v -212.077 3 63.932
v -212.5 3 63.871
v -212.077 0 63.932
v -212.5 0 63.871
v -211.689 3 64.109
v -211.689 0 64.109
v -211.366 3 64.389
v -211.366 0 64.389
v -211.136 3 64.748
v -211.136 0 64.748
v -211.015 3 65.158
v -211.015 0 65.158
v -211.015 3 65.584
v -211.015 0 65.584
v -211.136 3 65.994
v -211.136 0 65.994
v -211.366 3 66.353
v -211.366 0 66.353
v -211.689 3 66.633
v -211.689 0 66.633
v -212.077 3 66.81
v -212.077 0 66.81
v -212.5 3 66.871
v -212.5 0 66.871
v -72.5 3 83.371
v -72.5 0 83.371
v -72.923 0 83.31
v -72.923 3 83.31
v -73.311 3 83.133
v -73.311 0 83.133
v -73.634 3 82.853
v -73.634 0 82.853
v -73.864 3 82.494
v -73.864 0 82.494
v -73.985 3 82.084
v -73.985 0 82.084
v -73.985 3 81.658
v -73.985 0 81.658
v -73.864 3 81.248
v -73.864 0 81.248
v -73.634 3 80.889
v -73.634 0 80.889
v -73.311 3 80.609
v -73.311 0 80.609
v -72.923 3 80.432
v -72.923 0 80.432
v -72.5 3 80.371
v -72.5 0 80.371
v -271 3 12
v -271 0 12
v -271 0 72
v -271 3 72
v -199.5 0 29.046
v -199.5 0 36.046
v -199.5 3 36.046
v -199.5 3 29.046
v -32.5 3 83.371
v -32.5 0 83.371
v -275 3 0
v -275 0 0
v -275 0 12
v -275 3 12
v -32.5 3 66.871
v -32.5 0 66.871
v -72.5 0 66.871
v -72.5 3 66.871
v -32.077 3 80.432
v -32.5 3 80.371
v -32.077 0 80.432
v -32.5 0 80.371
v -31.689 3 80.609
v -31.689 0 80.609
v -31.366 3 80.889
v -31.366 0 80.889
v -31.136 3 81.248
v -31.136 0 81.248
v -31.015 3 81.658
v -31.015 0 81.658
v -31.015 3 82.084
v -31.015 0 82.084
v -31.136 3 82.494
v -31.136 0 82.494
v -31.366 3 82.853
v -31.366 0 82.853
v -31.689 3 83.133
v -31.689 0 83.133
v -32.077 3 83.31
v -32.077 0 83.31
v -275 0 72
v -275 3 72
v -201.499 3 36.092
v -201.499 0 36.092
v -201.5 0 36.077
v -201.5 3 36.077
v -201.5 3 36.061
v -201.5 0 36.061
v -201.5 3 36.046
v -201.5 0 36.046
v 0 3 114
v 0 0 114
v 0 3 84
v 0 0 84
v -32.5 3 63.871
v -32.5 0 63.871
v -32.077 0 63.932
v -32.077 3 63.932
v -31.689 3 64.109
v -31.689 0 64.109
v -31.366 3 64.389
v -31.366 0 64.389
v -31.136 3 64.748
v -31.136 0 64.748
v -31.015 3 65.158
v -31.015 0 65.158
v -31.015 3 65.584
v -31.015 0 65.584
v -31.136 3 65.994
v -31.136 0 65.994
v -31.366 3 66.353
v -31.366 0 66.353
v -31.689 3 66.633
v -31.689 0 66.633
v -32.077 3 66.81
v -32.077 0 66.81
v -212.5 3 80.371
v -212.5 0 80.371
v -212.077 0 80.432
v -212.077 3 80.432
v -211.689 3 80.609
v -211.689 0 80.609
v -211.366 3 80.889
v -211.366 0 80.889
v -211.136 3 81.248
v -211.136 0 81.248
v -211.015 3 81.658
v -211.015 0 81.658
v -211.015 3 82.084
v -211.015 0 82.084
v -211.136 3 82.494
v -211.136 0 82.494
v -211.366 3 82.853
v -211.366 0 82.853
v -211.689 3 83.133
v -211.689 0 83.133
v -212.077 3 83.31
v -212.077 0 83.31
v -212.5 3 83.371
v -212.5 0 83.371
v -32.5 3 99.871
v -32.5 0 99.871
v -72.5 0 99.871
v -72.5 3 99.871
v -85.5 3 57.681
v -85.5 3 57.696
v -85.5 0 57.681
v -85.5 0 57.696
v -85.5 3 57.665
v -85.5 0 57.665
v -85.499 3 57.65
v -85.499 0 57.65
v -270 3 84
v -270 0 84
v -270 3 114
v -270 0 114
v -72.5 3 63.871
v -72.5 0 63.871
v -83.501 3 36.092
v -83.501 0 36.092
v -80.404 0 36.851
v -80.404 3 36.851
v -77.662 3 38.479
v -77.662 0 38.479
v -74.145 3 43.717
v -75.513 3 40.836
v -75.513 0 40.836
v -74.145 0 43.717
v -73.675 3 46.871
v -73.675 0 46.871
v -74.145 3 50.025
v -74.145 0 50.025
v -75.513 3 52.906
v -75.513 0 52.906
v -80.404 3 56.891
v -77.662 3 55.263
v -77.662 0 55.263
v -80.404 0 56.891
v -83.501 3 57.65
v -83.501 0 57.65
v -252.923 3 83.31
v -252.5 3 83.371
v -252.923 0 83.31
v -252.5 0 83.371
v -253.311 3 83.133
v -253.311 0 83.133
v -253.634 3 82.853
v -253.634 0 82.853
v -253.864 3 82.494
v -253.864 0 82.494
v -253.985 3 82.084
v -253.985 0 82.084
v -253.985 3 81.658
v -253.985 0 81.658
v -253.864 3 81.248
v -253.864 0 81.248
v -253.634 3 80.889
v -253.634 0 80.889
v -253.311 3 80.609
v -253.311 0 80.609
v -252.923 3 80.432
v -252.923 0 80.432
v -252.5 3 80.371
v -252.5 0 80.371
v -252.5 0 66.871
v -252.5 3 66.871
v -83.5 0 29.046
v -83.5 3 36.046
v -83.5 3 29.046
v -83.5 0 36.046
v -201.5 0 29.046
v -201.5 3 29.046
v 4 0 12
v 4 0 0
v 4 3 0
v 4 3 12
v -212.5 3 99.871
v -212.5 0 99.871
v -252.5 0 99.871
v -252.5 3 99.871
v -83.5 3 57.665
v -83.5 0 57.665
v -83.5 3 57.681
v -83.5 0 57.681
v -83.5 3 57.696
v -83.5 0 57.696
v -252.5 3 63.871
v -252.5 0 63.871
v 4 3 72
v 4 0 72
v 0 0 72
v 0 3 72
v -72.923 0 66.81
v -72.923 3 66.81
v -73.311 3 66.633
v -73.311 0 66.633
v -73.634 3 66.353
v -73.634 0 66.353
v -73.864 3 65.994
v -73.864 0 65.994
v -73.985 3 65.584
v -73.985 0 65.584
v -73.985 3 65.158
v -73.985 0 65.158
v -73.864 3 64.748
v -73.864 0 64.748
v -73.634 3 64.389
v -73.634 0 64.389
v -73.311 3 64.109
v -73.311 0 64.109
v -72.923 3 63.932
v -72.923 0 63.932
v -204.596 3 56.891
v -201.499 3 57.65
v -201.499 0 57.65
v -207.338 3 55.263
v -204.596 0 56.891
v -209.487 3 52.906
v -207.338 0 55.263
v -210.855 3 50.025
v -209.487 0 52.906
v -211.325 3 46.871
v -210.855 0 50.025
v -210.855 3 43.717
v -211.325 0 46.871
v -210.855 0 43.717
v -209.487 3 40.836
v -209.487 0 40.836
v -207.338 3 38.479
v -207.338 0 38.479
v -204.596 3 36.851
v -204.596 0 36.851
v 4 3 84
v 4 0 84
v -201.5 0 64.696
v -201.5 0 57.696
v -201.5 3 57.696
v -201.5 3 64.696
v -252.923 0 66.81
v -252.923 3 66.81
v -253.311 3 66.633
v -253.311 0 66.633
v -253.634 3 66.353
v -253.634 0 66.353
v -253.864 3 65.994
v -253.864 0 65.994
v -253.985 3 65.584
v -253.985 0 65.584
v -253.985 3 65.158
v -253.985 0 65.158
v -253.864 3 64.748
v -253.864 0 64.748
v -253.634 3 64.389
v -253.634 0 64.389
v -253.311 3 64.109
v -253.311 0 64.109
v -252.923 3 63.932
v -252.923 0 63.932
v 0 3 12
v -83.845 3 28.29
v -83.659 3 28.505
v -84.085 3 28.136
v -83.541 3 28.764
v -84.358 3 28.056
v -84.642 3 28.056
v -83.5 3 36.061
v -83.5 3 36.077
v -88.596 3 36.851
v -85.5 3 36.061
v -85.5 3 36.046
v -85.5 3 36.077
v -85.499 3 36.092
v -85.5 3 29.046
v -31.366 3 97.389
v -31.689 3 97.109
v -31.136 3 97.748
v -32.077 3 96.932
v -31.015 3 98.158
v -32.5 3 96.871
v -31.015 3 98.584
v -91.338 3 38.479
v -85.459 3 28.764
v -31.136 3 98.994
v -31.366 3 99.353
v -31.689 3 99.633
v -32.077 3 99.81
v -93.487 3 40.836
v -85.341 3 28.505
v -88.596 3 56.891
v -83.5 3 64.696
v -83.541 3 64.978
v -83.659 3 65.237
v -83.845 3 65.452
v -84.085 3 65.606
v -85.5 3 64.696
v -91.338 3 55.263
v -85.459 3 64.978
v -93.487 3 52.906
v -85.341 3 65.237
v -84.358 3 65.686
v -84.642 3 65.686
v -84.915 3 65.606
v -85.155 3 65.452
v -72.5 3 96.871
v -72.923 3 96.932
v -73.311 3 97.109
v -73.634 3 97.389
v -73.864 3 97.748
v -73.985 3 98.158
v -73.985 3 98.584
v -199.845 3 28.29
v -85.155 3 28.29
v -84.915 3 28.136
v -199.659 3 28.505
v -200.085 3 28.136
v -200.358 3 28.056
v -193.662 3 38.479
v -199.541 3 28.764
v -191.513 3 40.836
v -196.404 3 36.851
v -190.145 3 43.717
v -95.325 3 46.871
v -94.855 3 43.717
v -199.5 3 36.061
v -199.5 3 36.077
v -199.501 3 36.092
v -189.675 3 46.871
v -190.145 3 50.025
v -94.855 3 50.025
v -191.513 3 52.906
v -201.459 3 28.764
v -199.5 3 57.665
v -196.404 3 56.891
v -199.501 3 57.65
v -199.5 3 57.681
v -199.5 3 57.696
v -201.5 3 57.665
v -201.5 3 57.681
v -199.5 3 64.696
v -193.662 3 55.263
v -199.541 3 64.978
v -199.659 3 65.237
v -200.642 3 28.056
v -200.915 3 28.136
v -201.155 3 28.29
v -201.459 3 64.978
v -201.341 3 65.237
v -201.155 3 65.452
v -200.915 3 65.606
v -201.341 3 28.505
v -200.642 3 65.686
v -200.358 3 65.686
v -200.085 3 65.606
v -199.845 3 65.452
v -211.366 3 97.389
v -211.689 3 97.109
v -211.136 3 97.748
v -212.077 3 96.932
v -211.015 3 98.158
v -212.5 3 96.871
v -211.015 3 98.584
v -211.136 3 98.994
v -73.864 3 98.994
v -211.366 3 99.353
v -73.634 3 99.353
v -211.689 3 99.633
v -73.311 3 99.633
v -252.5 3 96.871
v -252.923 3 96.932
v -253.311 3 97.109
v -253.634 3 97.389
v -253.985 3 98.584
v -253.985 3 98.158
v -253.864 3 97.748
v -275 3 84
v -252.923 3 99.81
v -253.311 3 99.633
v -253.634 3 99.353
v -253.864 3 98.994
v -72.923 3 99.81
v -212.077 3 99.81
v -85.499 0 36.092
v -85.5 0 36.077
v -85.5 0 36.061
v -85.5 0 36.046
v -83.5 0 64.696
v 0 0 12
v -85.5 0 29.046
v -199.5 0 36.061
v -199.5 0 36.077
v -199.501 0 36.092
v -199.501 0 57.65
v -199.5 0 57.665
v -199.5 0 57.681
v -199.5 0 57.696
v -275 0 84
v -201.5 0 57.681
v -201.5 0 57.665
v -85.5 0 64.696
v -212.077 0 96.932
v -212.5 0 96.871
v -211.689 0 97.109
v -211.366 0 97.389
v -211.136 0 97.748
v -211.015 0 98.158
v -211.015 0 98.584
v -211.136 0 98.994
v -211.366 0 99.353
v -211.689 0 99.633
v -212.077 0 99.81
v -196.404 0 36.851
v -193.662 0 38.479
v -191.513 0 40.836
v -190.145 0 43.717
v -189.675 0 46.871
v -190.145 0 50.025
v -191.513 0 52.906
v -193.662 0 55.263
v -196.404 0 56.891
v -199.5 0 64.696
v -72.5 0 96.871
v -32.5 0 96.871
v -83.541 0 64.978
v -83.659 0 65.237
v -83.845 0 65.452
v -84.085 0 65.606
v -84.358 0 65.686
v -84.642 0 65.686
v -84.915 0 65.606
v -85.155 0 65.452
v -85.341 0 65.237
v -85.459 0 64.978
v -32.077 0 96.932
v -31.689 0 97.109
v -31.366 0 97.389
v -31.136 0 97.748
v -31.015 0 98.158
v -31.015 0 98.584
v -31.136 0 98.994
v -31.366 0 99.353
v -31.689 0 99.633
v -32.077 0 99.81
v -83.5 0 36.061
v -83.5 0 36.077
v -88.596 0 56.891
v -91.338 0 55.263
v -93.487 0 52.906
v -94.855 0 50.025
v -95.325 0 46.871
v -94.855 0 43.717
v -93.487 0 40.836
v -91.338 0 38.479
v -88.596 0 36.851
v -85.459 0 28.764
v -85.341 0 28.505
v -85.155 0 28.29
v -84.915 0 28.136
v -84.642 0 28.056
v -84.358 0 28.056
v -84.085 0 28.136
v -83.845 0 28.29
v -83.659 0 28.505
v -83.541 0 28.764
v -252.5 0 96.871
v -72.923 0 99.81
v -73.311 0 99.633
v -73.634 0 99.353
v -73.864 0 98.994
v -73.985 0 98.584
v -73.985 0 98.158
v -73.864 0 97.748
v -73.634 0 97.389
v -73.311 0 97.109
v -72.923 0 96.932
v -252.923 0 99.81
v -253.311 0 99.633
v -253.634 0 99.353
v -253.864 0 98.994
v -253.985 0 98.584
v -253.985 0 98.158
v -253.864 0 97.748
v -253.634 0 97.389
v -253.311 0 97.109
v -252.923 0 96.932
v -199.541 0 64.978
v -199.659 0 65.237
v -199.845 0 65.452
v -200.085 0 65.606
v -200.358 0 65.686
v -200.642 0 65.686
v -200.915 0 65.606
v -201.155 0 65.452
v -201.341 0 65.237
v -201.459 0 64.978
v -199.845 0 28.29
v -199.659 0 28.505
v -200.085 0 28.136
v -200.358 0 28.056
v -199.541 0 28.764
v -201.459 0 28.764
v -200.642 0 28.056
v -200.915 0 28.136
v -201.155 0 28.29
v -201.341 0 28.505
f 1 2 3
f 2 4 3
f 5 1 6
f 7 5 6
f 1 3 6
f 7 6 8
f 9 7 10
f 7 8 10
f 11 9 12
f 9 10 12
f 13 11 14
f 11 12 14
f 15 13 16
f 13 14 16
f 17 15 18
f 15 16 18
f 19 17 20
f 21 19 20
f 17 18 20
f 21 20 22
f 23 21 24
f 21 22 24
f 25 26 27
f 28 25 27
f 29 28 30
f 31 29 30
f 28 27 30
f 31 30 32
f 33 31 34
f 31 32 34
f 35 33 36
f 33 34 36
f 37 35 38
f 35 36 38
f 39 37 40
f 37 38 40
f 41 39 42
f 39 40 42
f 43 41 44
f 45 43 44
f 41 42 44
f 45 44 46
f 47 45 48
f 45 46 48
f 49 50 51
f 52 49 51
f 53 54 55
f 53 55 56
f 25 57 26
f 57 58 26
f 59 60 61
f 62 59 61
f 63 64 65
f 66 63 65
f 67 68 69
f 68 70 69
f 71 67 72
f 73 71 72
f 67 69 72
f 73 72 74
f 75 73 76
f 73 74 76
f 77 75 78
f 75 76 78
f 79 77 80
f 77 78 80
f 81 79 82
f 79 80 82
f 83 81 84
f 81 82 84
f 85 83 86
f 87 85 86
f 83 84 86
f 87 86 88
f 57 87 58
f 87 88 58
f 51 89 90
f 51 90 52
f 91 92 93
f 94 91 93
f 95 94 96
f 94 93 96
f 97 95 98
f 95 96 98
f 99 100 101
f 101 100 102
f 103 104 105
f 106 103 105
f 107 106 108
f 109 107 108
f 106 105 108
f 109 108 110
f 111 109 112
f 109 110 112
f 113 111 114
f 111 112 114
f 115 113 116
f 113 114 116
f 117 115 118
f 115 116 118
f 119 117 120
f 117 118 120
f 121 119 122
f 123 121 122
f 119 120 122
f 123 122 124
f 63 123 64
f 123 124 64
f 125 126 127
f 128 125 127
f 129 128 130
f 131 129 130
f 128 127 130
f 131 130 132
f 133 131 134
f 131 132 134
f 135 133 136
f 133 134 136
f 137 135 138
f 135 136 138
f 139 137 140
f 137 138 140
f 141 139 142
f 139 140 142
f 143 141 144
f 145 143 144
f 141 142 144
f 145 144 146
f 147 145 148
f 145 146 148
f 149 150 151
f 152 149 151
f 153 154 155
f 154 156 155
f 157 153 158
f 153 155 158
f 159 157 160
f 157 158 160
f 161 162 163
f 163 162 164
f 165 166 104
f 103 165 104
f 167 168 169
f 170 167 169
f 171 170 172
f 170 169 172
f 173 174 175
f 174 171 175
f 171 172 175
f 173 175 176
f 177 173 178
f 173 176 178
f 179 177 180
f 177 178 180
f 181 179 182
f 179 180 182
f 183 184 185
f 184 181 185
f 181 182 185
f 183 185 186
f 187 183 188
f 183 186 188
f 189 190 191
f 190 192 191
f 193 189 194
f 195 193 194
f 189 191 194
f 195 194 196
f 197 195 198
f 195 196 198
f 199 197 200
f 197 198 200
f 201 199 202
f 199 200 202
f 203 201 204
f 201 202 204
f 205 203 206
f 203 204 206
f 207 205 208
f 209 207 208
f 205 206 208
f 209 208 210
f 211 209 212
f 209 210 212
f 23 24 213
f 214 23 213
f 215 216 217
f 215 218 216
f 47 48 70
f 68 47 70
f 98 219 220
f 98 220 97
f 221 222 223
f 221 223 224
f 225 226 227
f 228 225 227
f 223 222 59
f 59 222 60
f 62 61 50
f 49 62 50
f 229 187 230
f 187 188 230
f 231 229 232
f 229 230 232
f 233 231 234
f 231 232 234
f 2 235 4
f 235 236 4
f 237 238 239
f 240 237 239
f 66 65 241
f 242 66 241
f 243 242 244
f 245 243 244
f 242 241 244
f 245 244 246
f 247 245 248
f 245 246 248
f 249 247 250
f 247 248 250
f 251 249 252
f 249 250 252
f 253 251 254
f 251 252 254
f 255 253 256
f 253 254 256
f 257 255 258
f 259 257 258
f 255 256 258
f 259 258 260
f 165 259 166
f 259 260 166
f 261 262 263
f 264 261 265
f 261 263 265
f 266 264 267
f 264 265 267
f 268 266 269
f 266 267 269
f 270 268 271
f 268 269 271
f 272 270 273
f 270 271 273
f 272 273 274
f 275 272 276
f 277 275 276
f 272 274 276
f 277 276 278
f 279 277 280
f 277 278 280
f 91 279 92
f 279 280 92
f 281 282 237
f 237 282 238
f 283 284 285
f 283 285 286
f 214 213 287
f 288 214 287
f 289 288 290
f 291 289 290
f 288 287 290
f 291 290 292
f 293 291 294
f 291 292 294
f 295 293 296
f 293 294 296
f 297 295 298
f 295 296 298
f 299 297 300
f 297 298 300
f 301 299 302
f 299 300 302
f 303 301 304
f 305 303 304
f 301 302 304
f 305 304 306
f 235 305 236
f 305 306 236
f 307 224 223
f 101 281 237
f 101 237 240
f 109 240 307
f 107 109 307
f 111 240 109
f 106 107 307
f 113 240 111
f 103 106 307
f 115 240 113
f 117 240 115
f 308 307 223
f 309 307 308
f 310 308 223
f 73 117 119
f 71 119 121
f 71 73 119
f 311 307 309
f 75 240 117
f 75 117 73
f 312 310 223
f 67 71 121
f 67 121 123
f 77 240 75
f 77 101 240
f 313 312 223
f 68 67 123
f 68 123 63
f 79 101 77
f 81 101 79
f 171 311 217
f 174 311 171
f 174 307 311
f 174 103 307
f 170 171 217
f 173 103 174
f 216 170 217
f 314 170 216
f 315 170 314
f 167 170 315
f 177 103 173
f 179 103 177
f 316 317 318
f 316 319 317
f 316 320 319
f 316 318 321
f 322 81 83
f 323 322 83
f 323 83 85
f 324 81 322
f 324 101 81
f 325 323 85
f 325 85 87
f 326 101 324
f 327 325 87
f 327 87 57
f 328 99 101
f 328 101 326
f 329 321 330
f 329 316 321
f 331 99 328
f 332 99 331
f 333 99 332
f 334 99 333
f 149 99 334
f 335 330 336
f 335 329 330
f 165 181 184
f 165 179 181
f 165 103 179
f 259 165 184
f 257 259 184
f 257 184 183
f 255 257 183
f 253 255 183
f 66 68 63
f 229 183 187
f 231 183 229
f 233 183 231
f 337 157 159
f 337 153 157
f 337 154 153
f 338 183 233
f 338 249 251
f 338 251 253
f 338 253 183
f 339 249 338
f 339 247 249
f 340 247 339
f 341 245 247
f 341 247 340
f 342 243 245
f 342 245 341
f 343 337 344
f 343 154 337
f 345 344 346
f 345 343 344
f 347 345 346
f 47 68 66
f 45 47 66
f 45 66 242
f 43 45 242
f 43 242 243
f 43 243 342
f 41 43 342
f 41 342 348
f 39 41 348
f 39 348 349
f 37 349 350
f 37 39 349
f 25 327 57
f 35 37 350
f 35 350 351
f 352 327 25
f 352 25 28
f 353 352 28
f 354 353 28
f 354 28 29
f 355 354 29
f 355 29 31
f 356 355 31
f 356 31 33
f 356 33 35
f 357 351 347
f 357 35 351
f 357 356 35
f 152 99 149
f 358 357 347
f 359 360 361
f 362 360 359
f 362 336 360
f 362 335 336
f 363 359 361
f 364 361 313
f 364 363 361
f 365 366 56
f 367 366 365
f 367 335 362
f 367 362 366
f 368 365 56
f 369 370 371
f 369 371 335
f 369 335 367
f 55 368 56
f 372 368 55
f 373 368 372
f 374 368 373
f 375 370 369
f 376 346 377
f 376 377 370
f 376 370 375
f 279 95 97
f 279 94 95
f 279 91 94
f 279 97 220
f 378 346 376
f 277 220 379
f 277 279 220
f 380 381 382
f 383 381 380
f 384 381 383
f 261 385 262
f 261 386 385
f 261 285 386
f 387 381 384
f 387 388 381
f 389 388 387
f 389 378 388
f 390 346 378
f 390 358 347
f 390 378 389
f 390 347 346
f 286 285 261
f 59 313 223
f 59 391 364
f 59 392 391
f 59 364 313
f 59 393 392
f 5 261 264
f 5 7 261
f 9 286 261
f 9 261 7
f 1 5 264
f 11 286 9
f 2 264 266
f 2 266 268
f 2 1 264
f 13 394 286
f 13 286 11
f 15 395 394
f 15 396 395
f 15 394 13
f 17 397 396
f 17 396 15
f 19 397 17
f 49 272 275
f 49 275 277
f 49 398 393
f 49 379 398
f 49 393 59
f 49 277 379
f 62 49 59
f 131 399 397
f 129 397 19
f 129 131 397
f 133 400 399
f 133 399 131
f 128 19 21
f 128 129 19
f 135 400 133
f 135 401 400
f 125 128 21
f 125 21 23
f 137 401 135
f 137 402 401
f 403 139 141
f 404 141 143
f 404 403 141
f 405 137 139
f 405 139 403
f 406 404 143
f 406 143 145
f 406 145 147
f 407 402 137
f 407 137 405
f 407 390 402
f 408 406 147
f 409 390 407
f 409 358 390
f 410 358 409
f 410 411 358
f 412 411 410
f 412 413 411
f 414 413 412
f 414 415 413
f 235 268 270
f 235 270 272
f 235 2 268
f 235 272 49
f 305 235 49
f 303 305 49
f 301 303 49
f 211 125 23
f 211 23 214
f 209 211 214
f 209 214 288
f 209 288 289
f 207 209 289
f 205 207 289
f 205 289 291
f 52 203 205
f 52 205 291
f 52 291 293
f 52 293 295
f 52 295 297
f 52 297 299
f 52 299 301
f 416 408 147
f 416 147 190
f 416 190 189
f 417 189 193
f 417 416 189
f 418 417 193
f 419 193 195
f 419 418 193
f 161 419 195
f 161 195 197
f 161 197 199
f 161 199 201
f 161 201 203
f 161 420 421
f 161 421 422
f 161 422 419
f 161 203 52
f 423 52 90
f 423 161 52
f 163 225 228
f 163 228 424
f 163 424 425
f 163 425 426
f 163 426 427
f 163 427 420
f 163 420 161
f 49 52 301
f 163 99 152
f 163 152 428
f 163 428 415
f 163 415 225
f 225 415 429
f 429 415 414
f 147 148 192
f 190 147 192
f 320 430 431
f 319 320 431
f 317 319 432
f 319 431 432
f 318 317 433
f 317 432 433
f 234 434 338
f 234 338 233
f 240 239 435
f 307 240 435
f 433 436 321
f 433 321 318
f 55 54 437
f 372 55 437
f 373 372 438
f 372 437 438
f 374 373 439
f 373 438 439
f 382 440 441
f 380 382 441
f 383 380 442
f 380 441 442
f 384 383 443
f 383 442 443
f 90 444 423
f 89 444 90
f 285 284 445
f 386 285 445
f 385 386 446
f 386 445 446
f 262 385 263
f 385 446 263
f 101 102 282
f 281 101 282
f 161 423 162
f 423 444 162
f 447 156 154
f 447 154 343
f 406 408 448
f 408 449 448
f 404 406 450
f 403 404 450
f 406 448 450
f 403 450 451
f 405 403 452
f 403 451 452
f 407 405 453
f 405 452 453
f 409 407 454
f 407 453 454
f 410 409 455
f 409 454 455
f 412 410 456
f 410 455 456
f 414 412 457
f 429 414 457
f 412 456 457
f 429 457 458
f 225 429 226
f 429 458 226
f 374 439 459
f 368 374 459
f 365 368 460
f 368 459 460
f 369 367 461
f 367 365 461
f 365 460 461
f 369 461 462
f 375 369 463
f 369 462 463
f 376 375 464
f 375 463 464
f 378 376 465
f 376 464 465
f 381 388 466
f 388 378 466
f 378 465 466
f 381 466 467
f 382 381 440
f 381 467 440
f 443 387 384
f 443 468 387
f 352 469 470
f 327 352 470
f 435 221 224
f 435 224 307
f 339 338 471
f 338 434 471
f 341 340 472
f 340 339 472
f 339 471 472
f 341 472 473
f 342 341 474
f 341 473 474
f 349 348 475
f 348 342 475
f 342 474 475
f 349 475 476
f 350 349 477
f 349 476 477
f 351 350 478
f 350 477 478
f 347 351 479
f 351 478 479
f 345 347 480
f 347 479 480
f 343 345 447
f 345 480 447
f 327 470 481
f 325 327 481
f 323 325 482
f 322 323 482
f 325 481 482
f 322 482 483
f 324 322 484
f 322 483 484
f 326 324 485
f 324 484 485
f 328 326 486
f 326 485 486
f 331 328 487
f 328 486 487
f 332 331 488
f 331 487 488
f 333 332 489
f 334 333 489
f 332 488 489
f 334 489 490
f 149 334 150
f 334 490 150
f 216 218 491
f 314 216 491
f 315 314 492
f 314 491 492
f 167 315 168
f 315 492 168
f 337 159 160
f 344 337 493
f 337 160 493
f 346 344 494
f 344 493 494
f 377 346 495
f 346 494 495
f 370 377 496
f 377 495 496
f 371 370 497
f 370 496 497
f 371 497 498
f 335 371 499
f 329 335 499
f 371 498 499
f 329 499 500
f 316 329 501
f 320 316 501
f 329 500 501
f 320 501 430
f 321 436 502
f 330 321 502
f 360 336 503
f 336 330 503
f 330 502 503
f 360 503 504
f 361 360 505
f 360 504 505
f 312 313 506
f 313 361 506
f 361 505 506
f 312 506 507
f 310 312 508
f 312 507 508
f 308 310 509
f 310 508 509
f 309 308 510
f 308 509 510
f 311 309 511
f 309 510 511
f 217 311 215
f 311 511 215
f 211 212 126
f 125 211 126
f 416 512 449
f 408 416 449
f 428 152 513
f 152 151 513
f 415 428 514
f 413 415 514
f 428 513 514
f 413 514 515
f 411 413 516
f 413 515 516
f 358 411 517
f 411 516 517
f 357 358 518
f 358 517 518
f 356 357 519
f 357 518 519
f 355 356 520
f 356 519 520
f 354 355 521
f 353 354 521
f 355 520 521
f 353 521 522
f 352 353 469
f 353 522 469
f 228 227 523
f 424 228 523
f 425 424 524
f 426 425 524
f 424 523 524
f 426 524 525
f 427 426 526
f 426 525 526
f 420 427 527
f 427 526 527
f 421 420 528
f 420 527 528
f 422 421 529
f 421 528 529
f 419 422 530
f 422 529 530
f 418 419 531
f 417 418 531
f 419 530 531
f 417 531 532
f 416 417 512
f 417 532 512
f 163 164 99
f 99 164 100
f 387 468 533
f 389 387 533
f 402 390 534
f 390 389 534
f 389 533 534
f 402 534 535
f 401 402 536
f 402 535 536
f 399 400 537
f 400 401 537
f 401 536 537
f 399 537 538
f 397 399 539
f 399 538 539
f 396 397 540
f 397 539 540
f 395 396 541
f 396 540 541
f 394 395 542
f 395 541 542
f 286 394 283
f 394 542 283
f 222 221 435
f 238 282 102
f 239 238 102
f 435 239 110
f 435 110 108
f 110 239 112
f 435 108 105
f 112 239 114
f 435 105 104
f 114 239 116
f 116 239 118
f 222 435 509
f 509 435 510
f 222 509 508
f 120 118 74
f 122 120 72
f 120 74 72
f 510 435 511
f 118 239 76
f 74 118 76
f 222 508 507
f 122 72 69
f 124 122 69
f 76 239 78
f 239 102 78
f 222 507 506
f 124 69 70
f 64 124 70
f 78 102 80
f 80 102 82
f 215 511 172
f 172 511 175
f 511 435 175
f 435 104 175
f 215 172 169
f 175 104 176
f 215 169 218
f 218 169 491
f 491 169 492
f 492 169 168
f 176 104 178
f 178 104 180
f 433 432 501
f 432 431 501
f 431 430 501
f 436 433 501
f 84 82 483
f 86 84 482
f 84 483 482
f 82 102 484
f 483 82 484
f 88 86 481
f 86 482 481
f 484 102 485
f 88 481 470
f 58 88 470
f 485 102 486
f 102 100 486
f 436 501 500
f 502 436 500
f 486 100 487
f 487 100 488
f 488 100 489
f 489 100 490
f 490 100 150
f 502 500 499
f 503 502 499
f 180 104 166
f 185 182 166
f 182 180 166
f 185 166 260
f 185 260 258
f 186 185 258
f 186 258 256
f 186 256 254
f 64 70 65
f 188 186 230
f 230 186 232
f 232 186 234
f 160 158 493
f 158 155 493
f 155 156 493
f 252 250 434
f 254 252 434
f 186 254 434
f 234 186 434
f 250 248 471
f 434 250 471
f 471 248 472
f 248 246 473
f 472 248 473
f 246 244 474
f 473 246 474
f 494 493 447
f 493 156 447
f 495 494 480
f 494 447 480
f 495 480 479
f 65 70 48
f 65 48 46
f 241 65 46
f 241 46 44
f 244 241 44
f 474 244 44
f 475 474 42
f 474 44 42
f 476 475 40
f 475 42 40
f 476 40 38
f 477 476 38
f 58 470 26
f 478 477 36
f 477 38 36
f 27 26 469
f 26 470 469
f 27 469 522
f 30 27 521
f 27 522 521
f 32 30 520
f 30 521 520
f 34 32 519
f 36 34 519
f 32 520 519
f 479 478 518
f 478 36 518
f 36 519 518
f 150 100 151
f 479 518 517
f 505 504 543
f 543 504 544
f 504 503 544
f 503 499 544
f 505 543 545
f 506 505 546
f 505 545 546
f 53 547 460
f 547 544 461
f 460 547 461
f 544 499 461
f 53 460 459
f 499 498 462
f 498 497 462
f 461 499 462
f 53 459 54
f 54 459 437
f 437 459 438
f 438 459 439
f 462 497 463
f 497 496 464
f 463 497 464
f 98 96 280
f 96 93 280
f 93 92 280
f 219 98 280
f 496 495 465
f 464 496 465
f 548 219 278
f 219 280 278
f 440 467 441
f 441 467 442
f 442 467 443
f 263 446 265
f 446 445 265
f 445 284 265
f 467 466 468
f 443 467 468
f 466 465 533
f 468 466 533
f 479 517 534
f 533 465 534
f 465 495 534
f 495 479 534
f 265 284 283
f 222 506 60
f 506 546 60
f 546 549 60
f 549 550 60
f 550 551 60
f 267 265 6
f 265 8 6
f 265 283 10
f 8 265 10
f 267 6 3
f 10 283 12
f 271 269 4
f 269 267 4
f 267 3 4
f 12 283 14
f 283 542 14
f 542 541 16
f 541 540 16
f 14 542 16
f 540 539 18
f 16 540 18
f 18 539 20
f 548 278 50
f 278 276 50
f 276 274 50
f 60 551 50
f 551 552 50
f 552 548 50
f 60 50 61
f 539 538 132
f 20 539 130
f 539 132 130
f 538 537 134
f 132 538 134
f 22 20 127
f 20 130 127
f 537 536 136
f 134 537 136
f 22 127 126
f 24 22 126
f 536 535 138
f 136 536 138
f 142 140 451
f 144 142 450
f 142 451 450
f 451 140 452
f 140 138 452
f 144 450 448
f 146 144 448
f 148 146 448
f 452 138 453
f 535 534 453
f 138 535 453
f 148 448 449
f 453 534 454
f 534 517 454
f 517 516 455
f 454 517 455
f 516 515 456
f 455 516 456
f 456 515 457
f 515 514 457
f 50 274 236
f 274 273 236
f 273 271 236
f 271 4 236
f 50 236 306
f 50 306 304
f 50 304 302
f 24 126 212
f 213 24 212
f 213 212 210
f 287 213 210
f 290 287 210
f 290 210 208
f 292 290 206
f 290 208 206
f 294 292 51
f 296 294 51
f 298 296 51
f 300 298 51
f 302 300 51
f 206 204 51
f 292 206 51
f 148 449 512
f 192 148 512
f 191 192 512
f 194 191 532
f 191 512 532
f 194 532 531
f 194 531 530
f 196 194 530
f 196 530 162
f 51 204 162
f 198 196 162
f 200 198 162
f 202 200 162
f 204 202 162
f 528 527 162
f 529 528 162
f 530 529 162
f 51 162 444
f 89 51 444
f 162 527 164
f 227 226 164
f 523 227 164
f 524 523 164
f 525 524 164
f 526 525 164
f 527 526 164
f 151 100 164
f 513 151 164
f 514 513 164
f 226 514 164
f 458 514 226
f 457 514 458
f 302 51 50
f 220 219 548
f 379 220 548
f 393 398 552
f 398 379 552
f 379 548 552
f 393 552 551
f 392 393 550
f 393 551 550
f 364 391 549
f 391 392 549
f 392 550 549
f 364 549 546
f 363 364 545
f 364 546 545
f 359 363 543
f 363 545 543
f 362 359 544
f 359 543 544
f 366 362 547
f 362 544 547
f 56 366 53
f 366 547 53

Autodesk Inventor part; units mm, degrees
ref_plane "YZ Plane" through (0, 0, 0) normal (1, 0, 0) x (0, 1, 0)
ref_plane "XZ Plane" through (0, 0, 0) normal (0, 1, 0) x (-1, 0, 0)
ref_plane "XY Plane" through (0, 0, 0) normal (0, 0, 1) x (1, 0, 0)
sketch "Sketch1" plane through (0, 0, 0) normal (0, 1, 0) x (-1, 0, 0)
  line L0 (0, 0) -> (271, 0)
  line L1 (271, 0) -> (271, 84)
  line L2 (271, 84) -> (0, 84)
  line L3 (0, 84) -> (0, 0)
  line L4 (135.5, 84) -> (135.5, 0) construction
  line L5 (0, 84) -> (-4, 84)
  line L6 (-4, 84) -> (-4, 72)
  line L7 (-4, 72) -> (0, 72)
  line L8 (0, 72) -> (0, 84)
  line L9 (0, 0) -> (-4, 0)
  line L10 (-4, 0) -> (-4, 12)
  line L11 (-4, 12) -> (0, 12)
  line L12 (0, 12) -> (0, 0)
  line L13 (271, 84) -> (271, 0)
  line L14 (271, 84) -> (275, 84)
  line L15 (275, 84) -> (275, 72)
  line L16 (275, 72) -> (271, 72)
  line L17 (271, 72) -> (271, 84)
  line L18 (271, 0) -> (275, 0)
  line L19 (275, 0) -> (275, 12)
  line L20 (275, 12) -> (271, 12)
  line L21 (271, 12) -> (271, 0)
  line L22 (200.5, 46.871) -> (84.5, 46.871) construction
  circle A0 centre (200.5, 46.871) radius 10.825
  arc A1 (201.5, 64.696) -> (199.5, 64.696) centre (200.5, 64.696) ccw
  line L23 (200.5, 57.696) -> (200.5, 64.696) construction
  line L24 (201.5, 57.696) -> (201.5, 64.696)
  line L25 (199.5, 64.696) -> (199.5, 57.696)
  arc A2 (199.5, 57.696) -> (201.5, 57.696) centre (200.5, 57.696) ccw
  arc A3 (201.5, 36.046) -> (199.5, 36.046) centre (200.5, 36.046) ccw
  line L26 (201.5, 29.046) -> (201.5, 36.046)
  arc A4 (199.5, 29.046) -> (201.5, 29.046) centre (200.5, 29.046) ccw
  line L27 (200.5, 36.046) -> (200.5, 29.046) construction
  line L28 (199.5, 36.046) -> (199.5, 29.046)
  arc A5 (85.5, 36.046) -> (83.5, 36.046) centre (84.5, 36.046) ccw
  arc A6 (83.5, 57.696) -> (85.5, 57.696) centre (84.5, 57.696) ccw
  line L29 (83.5, 64.696) -> (83.5, 57.696)
  line L30 (84.5, 57.696) -> (84.5, 64.696) construction
  line L31 (85.5, 57.696) -> (85.5, 64.696)
  arc A7 (85.5, 64.696) -> (83.5, 64.696) centre (84.5, 64.696) ccw
  circle A8 centre (84.5, 46.871) radius 10.825
  arc A9 (83.5, 29.046) -> (85.5, 29.046) centre (84.5, 29.046) ccw
  line L32 (83.5, 36.046) -> (83.5, 29.046)
  line L33 (84.5, 36.046) -> (84.5, 29.046) construction
  line L34 (85.5, 29.046) -> (85.5, 36.046)
  point P0 (200.5, 61.196)
  point P1 (200.5, 32.546)
  point P2 (84.5, 46.871)
  point P3 (84.5, 61.196)
  point P4 (84.5, 32.546)
  dimension "d0" = 271
  dimension "d1" = 84
  dimension "d2" = 4
  dimension "d3" = 12
  dimension "d4" = 4
  dimension "d5" = 12
  dimension "d11" = 116
  dimension "d13" = 37.129
  dimension "d14" = 84.5
  dimension "d15" = 21.65
  dimension "d16" = 7
  dimension "d17" = 2
  dimension "d18" = 7
  dimension "d19" = 2
  dimension "d20" = 21.65
  dimension "d21" = 7
  dimension "d22" = 2
  dimension "d23" = 7
  dimension "d24" = 2
extrude "Extrusion1" add sketch "Sketch1" along normal blind 3
sketch "Sketch3" plane through (0, 0, 0) normal (0, -1, 0) x (1, 0, 0)
  line L0 (4, 0) -> (-275, 0) projected
  line L1 (-270, 114) -> (0, 114)
  line L2 (0, 114) -> (0, 84)
  line L3 (0, 84) -> (-270, 84)
  line L4 (-270, 84) -> (-270, 114)
  line L5 (-275, 84) -> (4, 84) projected
  point P0 (0, 0)
  dimension "d28" = 30
extrude "Extrusion2" add sketch "Sketch3" against normal blind 3
sketch "Sketch2" plane through (0, 0, 0) normal (0, -1, 0) x (1, 0, 0)
  circle A0 centre (-232.5, 81.871) radius 1.5 construction
  arc A1 (-199.5011, 36.0922) -> (-199.5011, 57.6498) centre (-200.5, 46.871) ccw projected
  circle A2 centre (-251.5, 81.871) radius 1.5 construction
  circle A3 centre (-251.5, 98.371) radius 1.5 construction
  circle A4 centre (-232.5, 98.371) radius 1.5 construction
  line L0 (-251.5, 98.371) -> (-232.5, 98.371) construction
  line L1 (-251.5, 98.371) -> (-251.5, 81.871) construction
  line L2 (-252.5, 98.371) -> (-212.5, 98.371) construction
  line L3 (-252.5, 96.871) -> (-212.5, 96.871)
  line L4 (-212.5, 99.871) -> (-252.5, 99.871)
  arc A5 (-252.5, 99.871) -> (-252.5, 96.871) centre (-252.5, 98.371) ccw
  arc A6 (-212.5, 96.871) -> (-212.5, 99.871) centre (-212.5, 98.371) ccw
  line L5 (-252.5, 81.871) -> (-212.5, 81.871) construction
  line L6 (-252.5, 80.371) -> (-212.5, 80.371)
  line L7 (-212.5, 83.371) -> (-252.5, 83.371)
  arc A7 (-252.5, 83.371) -> (-252.5, 80.371) centre (-252.5, 81.871) ccw
  arc A8 (-212.5, 80.371) -> (-212.5, 83.371) centre (-212.5, 81.871) ccw
  circle A9 centre (-52.5, 81.871) radius 1.5 construction
  arc A10 (-83.5011, 36.0922) -> (-83.5011, 57.6498) centre (-84.5, 46.871) ccw construction
  line L8 (-32.5, 81.871) -> (-72.5, 81.871) construction
  line L9 (-32.5, 83.371) -> (-72.5, 83.371)
  line L10 (-72.5, 80.371) -> (-32.5, 80.371)
  arc A11 (-32.5, 80.371) -> (-32.5, 83.371) centre (-32.5, 81.871) ccw
  arc A12 (-72.5, 83.371) -> (-72.5, 80.371) centre (-72.5, 81.871) ccw
  line L11 (-32.5, 98.371) -> (-72.5, 98.371) construction
  line L12 (-32.5, 99.871) -> (-72.5, 99.871)
  line L13 (-72.5, 96.871) -> (-32.5, 96.871)
  arc A13 (-32.5, 96.871) -> (-32.5, 99.871) centre (-32.5, 98.371) ccw
  arc A14 (-72.5, 99.871) -> (-72.5, 96.871) centre (-72.5, 98.371) ccw
  line L14 (-252.5, 65.371) -> (-212.5, 65.371) construction
  line L15 (-252.5, 63.871) -> (-212.5, 63.871)
  line L16 (-212.5, 66.871) -> (-252.5, 66.871)
  arc A15 (-252.5, 66.871) -> (-252.5, 63.871) centre (-252.5, 65.371) ccw
  arc A16 (-212.5, 63.871) -> (-212.5, 66.871) centre (-212.5, 65.371) ccw
  line L17 (-212.5, 81.871) -> (-212.5, 65.371) construction
  line L18 (-32.5, 65.371) -> (-72.5, 65.371) construction
  line L19 (-32.5, 66.871) -> (-72.5, 66.871)
  line L20 (-72.5, 63.871) -> (-32.5, 63.871)
  arc A17 (-32.5, 63.871) -> (-32.5, 66.871) centre (-32.5, 65.371) ccw
  arc A18 (-72.5, 66.871) -> (-72.5, 63.871) centre (-72.5, 65.371) ccw
  line L21 (-72.5, 81.871) -> (-72.5, 65.371) construction
  line L22 (-72.5, 98.371) -> (-72.5, 81.871) construction
  point P0 (0, 0)
  point P1 (-52.5, 98.371)
  point P2 (-232.5, 65.371)
  point P3 (-52.5, 65.371)
  dimension "d25" = 3
  dimension "d26" = 32
  dimension "d27" = 35
  dimension "d31" = 3
  dimension "d32" = 3
  dimension "d33" = 3
  dimension "d34" = 19
  dimension "d35" = 16.5
  dimension "d38" = 20
  dimension "d39" = 20
  dimension "d40" = 3
  dimension "d41" = 3
  dimension "d43" = 32
  dimension "d44" = 35
  dimension "d45" = 20
  dimension "d46" = 3
  dimension "d47" = 20
  dimension "d48" = 3
  dimension "d49" = 20
  dimension "d50" = 3
  dimension "d51" = 16.5
  dimension "d52" = 20
  dimension "d53" = 3
  dimension "d54" = 16.5
extrude "Extrusion3" cut sketch "Sketch2" against normal blind 3
equation "\"d4\" = d2"
equation "\"d31\" = d25"
equation "\"d32\" = d25"
equation "\"d33\" = d25"
equation "\"d41\" = d40"
equation "\"d43\" = d26"
equation "\"d44\" = d27"
properties part number "flipper-support"
